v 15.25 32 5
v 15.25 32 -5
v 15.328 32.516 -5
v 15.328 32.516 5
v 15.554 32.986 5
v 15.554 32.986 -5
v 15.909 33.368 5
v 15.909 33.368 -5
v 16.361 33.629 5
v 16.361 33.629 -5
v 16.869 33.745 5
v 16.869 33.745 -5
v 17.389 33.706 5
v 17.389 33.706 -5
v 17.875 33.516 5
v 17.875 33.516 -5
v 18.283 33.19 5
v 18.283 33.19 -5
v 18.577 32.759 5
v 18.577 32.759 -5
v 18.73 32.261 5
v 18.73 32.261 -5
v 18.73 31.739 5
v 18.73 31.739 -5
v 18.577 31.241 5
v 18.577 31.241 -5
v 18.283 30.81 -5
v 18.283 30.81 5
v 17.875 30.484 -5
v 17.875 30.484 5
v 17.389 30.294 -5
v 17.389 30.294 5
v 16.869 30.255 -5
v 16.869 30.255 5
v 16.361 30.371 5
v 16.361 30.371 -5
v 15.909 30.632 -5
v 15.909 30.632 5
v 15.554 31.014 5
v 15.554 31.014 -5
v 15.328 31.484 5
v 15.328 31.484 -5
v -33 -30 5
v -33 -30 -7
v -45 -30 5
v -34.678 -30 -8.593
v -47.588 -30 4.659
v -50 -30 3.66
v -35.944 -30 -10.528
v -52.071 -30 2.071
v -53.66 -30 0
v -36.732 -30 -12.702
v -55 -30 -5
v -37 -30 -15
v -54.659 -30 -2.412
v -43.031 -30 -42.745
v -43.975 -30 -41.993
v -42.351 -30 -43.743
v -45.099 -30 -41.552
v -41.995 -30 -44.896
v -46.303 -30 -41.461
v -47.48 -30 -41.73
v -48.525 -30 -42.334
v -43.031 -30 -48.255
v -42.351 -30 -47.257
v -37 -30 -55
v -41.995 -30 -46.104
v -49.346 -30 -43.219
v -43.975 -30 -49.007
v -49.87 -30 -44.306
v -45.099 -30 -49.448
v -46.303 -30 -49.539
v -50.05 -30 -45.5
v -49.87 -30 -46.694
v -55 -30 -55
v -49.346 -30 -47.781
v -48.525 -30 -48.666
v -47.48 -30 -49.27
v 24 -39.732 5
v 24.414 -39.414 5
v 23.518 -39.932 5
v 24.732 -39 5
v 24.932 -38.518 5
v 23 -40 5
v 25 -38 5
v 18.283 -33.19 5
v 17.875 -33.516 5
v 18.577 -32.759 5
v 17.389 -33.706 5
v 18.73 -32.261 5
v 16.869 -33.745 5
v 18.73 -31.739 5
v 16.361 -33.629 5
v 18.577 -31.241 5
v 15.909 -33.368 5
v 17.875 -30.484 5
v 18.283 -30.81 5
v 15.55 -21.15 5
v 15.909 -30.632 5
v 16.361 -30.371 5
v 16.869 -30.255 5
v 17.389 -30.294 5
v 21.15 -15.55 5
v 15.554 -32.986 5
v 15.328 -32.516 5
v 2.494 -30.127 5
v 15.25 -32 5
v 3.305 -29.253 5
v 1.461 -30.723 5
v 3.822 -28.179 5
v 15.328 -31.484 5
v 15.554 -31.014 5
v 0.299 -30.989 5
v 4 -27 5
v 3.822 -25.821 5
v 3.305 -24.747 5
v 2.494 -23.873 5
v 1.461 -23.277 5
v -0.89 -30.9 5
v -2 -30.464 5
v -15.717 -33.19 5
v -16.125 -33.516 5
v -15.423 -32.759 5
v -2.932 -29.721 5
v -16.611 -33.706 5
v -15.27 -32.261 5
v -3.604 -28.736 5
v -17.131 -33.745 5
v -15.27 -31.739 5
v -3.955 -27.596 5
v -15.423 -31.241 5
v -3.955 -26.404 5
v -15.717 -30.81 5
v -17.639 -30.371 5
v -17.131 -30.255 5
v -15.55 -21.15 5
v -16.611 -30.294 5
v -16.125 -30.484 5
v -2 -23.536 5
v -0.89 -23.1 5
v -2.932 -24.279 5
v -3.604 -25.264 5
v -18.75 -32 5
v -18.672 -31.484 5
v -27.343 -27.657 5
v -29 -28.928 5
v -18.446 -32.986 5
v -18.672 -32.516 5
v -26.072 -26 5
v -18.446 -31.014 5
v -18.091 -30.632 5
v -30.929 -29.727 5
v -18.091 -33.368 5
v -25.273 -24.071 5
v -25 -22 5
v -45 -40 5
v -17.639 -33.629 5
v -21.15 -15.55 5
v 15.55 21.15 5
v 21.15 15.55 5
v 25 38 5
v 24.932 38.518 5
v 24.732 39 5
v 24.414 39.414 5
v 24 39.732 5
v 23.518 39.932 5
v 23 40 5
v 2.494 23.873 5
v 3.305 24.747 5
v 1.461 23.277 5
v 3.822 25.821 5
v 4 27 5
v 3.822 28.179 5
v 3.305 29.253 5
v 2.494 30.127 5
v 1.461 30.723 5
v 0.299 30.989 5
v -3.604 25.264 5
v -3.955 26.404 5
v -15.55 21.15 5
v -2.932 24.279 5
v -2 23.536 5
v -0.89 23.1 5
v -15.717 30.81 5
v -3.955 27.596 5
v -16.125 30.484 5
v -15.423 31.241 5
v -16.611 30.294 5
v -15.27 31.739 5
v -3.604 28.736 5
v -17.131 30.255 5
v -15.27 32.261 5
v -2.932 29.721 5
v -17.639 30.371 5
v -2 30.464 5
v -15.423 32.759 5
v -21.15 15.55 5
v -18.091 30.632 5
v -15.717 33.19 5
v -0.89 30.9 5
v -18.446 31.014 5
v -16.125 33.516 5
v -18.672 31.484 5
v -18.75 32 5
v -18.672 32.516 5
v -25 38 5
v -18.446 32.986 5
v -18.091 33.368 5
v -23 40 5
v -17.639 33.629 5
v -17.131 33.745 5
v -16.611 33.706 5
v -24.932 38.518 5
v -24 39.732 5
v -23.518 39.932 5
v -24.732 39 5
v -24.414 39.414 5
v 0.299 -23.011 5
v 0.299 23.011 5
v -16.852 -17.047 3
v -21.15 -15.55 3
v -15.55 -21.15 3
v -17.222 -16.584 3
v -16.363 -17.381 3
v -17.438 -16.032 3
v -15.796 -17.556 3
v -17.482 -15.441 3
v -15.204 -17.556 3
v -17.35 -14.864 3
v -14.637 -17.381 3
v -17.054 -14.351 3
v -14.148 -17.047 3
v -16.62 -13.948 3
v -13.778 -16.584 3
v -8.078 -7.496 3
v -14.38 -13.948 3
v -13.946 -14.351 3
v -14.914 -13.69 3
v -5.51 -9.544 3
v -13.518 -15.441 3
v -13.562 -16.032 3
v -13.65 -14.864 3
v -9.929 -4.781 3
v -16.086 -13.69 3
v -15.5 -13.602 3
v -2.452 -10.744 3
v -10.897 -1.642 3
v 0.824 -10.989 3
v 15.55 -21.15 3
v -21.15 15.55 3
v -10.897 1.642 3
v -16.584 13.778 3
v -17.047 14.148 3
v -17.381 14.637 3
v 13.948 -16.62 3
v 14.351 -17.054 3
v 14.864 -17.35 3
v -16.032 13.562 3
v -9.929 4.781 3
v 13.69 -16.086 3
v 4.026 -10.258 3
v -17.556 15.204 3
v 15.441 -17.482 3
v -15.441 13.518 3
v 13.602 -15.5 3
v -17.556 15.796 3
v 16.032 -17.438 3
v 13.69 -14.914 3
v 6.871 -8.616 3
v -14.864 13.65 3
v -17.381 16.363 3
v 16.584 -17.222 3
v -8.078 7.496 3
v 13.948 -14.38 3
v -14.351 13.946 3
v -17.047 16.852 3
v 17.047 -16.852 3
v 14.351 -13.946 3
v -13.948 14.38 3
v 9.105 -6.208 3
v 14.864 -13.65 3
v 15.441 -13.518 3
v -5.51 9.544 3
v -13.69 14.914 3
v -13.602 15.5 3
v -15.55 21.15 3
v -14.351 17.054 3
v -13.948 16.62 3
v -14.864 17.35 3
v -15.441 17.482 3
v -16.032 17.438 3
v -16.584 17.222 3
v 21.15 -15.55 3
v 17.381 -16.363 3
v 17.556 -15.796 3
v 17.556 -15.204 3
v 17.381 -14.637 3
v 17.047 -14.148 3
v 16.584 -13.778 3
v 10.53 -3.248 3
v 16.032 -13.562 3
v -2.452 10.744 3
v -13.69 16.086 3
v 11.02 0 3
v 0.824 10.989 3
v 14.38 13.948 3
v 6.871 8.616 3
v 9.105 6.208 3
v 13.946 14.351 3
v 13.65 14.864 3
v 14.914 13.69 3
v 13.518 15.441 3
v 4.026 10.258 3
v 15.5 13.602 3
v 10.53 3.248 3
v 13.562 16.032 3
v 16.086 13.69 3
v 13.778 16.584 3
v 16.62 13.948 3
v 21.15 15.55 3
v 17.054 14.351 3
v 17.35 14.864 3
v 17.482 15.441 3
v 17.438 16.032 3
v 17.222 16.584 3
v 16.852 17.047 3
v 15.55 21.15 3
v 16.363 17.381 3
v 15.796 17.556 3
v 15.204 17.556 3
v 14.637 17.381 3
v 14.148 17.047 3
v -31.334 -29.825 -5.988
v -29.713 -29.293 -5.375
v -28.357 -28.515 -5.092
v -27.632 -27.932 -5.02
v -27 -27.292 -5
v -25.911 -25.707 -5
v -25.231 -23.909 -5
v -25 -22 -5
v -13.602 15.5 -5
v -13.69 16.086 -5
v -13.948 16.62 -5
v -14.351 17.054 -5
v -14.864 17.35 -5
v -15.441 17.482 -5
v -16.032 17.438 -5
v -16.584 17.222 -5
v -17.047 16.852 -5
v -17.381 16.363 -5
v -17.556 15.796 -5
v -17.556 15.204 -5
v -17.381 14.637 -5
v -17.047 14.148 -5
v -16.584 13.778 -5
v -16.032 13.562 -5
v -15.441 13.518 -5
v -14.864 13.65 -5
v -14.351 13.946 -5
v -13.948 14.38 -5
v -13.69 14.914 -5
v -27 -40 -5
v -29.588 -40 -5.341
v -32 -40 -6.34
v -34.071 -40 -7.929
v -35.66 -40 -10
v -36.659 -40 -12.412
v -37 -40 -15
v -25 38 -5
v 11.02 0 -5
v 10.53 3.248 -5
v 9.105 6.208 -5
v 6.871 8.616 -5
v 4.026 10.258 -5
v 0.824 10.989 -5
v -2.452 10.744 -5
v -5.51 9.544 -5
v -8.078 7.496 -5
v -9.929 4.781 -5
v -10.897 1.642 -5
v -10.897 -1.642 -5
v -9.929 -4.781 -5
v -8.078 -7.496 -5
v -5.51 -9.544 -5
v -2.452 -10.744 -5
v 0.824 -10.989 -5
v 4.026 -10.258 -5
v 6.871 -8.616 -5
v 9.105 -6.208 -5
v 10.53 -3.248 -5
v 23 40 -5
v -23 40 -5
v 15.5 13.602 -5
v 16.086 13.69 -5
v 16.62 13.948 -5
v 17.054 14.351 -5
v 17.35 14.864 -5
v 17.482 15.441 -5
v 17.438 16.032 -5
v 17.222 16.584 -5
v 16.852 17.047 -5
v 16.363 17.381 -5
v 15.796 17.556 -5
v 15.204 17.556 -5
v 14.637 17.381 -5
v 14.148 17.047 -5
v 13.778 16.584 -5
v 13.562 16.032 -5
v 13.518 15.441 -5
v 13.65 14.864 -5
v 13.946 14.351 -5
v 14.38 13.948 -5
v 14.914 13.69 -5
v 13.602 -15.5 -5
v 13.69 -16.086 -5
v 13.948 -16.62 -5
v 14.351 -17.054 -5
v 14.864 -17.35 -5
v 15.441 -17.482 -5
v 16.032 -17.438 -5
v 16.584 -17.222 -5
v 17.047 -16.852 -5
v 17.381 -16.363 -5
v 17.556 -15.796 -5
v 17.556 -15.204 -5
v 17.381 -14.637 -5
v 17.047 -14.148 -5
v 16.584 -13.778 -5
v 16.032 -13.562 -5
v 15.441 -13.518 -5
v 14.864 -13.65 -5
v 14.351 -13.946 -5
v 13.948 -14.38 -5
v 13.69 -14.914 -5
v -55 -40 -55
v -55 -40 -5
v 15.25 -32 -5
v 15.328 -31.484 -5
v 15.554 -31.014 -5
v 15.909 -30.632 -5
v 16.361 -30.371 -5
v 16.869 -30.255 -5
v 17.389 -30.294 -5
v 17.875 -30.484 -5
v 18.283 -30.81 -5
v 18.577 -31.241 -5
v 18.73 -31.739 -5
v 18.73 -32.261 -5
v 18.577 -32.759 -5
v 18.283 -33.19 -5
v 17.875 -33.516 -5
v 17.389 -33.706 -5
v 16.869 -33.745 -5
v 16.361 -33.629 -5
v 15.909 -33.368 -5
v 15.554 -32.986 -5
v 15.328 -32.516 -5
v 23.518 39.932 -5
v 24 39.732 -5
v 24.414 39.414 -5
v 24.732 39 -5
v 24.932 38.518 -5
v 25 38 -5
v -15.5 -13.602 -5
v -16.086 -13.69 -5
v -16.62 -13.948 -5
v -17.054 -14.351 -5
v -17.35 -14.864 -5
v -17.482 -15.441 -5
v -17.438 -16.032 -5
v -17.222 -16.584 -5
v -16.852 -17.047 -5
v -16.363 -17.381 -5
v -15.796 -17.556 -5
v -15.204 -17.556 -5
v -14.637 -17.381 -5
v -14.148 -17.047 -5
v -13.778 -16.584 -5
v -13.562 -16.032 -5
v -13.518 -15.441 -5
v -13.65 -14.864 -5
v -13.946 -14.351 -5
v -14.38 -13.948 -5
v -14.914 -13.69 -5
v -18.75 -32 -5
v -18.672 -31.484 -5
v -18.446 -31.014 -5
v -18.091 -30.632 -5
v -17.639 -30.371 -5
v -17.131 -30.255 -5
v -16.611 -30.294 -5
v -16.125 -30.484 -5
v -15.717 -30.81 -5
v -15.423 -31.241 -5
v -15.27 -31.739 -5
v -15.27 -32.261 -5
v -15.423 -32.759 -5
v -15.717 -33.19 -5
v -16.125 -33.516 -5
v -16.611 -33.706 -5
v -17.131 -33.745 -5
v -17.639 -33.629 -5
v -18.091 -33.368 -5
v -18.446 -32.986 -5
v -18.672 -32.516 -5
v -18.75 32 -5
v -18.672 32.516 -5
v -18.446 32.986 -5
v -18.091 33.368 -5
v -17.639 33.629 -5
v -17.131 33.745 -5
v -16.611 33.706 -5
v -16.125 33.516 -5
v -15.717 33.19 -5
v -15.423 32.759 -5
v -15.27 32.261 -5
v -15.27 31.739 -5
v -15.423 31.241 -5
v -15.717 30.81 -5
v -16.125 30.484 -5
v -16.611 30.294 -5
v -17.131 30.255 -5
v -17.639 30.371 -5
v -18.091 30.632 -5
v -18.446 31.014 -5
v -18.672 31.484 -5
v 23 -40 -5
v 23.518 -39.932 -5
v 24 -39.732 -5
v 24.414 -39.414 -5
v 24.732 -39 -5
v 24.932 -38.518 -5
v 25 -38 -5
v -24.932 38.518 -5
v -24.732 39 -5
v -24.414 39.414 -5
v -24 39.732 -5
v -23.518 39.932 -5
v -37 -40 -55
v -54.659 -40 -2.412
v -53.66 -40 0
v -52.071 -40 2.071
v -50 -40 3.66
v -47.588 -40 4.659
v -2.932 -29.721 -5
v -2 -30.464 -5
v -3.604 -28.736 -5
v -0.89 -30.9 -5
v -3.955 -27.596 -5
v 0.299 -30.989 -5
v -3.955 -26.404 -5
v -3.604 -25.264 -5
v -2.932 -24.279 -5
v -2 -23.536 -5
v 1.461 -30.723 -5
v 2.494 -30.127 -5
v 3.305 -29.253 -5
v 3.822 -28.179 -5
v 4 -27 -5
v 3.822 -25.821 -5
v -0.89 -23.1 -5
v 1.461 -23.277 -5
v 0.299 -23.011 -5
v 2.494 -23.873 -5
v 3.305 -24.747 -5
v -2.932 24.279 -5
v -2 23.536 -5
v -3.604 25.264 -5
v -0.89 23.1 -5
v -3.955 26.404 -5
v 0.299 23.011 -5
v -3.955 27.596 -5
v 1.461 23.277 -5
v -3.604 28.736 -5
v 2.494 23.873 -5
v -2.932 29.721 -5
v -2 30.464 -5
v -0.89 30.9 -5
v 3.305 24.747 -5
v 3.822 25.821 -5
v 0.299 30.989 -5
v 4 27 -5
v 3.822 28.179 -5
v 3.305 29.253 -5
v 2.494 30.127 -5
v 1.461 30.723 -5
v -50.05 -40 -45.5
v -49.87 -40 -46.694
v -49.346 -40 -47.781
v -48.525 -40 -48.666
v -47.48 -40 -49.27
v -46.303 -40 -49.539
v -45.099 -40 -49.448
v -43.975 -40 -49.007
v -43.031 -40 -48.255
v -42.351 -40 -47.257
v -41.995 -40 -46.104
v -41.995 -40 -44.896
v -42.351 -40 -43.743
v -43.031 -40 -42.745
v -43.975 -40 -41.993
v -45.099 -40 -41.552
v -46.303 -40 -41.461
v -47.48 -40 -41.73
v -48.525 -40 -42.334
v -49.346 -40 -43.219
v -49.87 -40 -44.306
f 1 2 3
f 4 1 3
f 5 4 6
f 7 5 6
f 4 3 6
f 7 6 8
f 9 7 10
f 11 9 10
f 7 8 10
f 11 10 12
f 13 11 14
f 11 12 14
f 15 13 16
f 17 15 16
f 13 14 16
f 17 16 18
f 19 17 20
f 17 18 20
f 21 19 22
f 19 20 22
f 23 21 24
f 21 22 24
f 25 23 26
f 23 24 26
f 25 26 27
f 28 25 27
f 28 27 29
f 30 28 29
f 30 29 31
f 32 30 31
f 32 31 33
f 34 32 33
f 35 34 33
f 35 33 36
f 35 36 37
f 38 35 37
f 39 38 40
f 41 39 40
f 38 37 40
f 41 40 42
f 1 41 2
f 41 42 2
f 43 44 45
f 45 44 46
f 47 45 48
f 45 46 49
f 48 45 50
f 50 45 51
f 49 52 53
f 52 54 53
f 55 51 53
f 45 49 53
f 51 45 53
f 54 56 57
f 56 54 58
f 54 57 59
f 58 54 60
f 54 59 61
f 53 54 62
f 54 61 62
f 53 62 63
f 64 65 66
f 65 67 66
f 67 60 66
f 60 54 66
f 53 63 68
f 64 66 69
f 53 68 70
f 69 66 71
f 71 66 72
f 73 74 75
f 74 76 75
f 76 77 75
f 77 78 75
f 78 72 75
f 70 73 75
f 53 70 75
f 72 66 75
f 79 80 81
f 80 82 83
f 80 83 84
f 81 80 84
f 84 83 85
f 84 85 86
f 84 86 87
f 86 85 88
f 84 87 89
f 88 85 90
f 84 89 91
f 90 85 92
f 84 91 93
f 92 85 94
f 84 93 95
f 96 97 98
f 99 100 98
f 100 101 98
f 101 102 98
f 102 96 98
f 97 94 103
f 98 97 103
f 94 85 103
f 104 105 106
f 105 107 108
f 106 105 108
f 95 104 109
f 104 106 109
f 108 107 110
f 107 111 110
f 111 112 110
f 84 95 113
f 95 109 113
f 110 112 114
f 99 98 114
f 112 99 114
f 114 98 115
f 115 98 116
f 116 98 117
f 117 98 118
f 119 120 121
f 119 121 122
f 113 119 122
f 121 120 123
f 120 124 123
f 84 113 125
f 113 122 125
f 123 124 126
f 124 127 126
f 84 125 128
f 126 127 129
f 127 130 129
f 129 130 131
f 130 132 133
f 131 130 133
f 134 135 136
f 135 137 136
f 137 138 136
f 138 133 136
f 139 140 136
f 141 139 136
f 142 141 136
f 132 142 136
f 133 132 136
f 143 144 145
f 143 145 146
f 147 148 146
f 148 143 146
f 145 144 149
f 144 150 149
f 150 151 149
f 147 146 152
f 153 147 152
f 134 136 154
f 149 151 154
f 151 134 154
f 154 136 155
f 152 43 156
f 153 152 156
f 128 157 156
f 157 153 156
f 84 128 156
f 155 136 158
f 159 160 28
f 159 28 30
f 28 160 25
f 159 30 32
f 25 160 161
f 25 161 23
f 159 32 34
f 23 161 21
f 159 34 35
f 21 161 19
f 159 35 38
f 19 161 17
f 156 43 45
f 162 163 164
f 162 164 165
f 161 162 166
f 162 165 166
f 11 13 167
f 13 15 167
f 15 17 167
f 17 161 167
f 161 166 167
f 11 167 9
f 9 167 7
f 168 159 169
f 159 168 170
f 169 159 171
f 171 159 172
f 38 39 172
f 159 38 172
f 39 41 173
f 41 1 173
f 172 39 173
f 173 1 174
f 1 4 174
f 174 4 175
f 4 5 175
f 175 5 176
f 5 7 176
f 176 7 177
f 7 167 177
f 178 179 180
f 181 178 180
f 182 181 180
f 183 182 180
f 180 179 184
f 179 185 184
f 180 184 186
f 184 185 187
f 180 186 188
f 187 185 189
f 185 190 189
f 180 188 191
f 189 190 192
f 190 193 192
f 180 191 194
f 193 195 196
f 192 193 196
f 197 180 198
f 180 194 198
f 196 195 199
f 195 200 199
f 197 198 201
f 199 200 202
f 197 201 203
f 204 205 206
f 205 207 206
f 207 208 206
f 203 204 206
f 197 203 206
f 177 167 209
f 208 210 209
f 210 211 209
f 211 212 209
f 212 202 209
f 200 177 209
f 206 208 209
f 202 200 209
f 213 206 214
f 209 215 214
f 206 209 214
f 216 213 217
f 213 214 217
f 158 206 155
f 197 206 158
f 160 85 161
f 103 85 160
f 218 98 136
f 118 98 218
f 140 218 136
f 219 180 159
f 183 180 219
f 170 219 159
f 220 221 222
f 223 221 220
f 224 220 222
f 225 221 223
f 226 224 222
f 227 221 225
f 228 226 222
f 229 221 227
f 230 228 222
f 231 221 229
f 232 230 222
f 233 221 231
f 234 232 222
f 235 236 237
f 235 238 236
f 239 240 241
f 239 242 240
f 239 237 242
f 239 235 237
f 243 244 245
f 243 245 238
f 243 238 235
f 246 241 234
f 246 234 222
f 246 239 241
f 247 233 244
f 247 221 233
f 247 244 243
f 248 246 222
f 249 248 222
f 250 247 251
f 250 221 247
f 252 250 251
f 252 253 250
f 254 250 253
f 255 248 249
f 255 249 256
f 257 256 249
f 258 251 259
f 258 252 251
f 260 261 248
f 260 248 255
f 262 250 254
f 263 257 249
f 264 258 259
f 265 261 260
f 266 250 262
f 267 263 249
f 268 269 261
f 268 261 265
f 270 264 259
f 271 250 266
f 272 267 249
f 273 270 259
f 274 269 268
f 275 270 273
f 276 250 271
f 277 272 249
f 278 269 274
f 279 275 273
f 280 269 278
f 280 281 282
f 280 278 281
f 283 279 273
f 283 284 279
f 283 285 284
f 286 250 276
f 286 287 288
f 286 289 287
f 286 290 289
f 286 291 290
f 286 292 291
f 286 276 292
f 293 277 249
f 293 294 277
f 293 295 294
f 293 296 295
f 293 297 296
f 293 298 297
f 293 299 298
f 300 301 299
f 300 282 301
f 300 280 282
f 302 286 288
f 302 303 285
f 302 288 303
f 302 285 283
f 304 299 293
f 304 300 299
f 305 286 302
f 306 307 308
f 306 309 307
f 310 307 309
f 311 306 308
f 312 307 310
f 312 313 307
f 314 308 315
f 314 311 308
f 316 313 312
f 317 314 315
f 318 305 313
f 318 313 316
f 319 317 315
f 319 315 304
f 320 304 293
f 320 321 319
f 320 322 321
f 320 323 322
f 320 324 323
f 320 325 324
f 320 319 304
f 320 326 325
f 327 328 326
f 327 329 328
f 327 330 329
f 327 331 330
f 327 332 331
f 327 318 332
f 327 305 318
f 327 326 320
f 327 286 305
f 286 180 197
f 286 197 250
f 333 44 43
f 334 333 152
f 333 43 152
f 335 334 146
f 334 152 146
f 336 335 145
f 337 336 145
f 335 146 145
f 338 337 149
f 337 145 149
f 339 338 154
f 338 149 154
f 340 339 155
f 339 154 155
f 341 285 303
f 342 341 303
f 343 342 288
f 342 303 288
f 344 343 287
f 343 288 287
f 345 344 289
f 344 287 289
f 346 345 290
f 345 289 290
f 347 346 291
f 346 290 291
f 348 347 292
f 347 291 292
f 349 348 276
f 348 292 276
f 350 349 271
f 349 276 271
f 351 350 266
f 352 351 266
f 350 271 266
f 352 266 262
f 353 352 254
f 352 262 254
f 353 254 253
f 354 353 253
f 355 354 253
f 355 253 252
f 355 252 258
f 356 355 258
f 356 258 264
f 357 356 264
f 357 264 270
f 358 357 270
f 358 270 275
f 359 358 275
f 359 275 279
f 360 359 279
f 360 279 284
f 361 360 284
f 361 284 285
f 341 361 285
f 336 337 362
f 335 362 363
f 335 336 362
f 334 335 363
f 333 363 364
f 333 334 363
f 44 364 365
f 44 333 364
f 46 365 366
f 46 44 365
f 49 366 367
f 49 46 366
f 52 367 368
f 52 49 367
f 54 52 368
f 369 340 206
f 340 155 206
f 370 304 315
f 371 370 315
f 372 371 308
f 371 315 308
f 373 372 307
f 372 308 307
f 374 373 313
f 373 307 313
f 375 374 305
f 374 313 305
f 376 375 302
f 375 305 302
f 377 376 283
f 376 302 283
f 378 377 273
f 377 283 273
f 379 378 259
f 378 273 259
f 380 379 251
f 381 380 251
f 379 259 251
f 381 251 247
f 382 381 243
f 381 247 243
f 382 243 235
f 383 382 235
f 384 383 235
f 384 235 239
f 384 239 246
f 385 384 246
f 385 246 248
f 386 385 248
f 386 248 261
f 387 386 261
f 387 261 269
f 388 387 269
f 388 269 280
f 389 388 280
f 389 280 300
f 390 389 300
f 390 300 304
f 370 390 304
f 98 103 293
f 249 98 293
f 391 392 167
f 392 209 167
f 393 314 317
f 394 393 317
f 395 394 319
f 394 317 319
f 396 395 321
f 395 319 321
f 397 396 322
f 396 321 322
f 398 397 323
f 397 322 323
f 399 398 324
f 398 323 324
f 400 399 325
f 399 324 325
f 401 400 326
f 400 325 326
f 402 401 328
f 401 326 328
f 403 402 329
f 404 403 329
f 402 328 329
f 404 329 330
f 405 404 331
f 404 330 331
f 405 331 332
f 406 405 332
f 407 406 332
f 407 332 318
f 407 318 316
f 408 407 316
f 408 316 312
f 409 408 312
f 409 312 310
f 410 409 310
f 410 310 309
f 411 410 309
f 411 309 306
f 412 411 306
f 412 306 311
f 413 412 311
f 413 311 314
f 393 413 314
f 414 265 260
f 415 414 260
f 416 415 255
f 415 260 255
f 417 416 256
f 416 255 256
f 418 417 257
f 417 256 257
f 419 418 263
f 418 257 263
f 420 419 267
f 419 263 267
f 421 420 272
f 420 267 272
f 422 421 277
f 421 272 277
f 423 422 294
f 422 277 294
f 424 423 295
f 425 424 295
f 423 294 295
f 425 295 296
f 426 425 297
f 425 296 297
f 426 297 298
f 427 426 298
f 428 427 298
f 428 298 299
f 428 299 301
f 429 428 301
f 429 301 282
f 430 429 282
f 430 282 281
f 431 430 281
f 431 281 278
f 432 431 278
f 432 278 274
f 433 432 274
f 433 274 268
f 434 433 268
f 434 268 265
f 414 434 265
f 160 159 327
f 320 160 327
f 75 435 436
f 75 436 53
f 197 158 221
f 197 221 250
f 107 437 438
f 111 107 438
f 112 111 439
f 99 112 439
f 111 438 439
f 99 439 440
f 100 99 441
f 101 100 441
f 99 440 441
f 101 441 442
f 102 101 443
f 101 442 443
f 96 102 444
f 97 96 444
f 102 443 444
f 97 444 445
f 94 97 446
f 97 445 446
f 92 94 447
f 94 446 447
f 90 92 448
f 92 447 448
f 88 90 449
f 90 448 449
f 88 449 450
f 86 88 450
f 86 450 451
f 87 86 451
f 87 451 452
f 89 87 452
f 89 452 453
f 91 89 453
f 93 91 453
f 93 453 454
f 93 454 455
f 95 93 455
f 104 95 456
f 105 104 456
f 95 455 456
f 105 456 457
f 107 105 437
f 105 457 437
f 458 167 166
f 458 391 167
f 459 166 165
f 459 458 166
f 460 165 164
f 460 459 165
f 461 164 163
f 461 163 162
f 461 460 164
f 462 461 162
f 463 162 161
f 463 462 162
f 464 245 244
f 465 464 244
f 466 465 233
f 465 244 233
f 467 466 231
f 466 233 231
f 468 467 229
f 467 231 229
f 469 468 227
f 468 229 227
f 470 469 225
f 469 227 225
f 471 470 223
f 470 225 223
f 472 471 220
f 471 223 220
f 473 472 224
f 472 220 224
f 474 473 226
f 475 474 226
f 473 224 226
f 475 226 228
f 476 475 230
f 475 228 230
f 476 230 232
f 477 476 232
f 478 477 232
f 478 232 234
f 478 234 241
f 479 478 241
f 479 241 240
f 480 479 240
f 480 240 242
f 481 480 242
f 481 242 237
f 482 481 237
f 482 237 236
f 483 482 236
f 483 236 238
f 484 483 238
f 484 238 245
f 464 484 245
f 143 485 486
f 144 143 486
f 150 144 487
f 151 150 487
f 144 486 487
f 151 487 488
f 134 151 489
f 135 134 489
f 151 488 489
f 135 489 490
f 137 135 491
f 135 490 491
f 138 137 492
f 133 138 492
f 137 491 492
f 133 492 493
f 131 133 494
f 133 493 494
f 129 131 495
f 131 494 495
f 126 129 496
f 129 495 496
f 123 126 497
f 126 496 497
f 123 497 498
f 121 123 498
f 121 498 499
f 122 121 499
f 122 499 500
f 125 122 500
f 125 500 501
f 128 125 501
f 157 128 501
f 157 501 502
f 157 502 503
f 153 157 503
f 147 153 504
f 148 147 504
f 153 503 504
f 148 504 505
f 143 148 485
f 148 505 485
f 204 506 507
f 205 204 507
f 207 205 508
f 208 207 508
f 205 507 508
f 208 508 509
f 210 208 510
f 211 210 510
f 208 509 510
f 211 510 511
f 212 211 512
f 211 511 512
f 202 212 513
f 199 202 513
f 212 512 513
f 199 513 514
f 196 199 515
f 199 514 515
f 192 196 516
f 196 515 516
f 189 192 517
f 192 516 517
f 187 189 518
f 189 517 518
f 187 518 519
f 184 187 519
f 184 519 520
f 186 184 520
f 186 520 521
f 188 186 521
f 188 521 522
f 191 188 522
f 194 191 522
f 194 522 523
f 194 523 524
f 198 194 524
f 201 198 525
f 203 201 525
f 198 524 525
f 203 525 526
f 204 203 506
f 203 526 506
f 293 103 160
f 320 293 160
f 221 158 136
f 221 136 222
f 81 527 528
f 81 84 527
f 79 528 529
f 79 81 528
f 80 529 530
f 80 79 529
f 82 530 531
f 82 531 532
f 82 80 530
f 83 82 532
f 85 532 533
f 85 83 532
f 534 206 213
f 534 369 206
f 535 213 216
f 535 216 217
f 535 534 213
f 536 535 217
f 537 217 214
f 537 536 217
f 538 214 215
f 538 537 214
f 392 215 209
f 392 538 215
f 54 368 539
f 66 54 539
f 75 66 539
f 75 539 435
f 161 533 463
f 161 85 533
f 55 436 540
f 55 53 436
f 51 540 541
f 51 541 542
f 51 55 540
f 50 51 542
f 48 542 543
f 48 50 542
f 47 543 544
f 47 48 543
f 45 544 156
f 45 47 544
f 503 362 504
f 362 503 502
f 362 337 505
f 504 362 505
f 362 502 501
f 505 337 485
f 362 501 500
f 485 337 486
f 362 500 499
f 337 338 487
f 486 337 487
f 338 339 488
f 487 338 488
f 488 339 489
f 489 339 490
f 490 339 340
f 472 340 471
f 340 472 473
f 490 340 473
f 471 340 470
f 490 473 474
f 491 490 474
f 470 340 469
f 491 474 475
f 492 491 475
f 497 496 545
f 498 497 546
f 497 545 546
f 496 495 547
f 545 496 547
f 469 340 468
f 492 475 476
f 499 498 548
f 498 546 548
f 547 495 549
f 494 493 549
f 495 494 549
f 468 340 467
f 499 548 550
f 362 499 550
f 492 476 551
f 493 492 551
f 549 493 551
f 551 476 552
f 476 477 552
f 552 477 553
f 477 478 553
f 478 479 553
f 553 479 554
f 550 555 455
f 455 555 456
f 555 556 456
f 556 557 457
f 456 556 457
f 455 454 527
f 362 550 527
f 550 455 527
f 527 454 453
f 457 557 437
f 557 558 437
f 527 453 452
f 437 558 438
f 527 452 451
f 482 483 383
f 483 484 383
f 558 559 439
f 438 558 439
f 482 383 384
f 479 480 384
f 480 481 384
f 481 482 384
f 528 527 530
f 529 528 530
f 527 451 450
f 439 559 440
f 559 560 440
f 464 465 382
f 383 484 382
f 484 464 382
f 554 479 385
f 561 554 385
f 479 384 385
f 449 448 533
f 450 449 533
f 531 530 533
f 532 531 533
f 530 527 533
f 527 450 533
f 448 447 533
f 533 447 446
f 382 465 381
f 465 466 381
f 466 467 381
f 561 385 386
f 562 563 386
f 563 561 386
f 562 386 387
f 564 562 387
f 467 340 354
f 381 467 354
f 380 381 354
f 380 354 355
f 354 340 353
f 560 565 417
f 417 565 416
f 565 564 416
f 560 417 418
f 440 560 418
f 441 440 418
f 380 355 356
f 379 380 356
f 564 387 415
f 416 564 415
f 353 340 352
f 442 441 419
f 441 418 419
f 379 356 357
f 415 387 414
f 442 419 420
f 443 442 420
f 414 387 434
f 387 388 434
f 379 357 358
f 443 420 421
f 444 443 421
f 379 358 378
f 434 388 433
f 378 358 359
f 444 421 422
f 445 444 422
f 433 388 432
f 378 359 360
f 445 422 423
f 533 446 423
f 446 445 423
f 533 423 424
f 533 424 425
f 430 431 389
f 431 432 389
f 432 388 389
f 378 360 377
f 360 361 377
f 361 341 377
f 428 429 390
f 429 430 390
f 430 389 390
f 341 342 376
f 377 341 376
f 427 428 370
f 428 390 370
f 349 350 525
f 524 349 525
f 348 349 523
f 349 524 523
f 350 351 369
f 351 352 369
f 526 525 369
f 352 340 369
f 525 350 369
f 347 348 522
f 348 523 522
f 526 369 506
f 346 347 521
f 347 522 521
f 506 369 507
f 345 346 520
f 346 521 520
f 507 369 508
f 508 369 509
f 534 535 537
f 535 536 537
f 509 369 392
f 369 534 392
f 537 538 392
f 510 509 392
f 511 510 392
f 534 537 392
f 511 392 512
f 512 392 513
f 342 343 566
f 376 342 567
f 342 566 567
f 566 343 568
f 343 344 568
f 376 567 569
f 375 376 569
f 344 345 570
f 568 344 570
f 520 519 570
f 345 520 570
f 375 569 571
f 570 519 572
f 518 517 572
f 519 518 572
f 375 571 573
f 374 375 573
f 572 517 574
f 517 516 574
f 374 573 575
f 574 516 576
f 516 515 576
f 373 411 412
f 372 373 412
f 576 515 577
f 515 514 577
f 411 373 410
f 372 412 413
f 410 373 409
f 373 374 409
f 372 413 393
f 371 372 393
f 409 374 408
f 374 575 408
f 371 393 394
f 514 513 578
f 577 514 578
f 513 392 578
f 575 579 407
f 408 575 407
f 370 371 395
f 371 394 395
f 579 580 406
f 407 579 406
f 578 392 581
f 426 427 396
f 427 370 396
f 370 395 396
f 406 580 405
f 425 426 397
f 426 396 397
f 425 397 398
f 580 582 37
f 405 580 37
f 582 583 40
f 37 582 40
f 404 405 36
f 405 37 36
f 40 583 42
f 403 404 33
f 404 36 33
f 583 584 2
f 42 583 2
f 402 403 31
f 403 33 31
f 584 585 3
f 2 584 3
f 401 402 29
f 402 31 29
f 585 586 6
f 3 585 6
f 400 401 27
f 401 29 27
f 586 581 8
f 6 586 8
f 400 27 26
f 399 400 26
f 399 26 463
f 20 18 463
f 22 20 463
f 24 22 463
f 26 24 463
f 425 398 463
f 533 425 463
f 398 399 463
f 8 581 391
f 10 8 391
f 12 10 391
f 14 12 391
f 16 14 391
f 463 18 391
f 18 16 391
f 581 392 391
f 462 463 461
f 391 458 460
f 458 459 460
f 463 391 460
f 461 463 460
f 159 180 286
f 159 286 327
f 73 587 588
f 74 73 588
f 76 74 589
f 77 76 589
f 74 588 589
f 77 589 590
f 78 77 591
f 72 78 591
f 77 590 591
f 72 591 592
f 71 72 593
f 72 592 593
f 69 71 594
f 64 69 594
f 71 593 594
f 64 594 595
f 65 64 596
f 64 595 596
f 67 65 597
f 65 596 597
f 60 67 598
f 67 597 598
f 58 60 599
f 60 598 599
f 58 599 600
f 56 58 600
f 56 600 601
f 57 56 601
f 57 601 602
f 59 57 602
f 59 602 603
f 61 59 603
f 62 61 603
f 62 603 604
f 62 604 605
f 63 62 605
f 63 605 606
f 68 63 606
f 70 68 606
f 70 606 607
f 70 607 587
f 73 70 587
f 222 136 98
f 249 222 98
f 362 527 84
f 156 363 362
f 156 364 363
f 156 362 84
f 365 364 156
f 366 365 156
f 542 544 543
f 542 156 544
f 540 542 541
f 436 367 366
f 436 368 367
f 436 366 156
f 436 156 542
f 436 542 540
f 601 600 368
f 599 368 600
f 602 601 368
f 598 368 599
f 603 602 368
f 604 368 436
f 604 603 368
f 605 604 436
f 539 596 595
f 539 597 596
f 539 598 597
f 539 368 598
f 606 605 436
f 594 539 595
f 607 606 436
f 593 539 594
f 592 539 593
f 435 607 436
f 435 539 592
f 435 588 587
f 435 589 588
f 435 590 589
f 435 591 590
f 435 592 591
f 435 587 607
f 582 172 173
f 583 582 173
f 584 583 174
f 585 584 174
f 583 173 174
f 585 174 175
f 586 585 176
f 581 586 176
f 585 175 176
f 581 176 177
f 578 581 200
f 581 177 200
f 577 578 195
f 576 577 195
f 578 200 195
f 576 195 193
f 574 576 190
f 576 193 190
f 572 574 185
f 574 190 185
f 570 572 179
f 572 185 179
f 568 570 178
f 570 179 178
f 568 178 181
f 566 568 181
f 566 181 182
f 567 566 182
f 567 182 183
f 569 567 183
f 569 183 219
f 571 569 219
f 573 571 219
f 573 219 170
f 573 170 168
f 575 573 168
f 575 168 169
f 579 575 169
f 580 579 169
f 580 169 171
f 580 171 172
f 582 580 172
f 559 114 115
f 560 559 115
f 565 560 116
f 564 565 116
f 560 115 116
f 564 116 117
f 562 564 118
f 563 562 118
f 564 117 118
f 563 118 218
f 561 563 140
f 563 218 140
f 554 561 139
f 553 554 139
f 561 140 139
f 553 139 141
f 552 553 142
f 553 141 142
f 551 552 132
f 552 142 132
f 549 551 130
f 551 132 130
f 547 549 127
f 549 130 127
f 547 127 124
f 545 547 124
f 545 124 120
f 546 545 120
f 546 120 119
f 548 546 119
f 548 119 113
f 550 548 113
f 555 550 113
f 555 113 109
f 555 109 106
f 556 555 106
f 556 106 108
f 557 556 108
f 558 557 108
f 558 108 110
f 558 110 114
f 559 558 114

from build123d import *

# Parameters (mm, degrees)
ESBO_O1_W                     = 50
ESBO_O1_H                     = 80
RESSALTO_EXTRUS_O1_DEPTH      = 5
ESBO_O2_W                     = 42.3
ESBO_O2_H                     = 42.3
CORTE_EXTRUS_O1_DEPTH         = 2
ESBO_O3_R                     = 11.02
CORTE_EXTRUS_O2_DEPTH         = 24
ESBO_O4_R                     = 1.987893006
CORTE_EXTRUS_O3_DEPTH         = 24
PADR_OCIRCULAR1_COUNT         = 4
ESBO_O5_R                     = 4
CORTE_EXTRUS_O4_DEPTH         = 24
CHANFRO1_SIZE                 = 5.6
ESBO_O6_R                     = 1.75
CORTE_EXTRUS_O5_DEPTH         = 10
FILETE1_R                     = 2
ESBO_O7_W                     = 30
ESBO_O7_H                     = 10
RESSALTO_EXTRUS_O2_DEPTH      = 50
RESSALTO_EXTRUS_O2_DEPTH_BACK = 10
ESBO_O8_R                     = 4.05
CORTE_EXTRUS_O6_DEPTH         = 45
ESBO_O9_W                     = 12
ESBO_O9_H                     = 50
CORTE_EXTRUS_O7_DEPTH         = 45
FILETE2_R                     = 10
FILETE3_R                     = 8


with BuildPart() as part:
    # Esboço1 → Ressalto-extrusão1 (new body, symmetric)
    with BuildSketch(Plane.XY):
        Rectangle(ESBO_O1_W, ESBO_O1_H)
    extrude(amount=RESSALTO_EXTRUS_O1_DEPTH, both=True)

    # Esboço2 → Corte-extrusão1 (cut)
    with BuildSketch(Plane.XY.offset(5)):
        Rectangle(ESBO_O2_W, ESBO_O2_H)
    extrude(amount=-CORTE_EXTRUS_O1_DEPTH, mode=Mode.SUBTRACT)

    # Esboço3 → Corte-extrusão2 (cut)
    with BuildSketch(Plane.XY.offset(3)):
        Circle(ESBO_O3_R)
    extrude(amount=-CORTE_EXTRUS_O2_DEPTH, mode=Mode.SUBTRACT)

    # Esboço4 → Corte-extrusão3 (cut)
    with BuildSketch(Plane.XY.offset(3)):
        with Locations((-15.59, 15.5)):
            Circle(ESBO_O4_R)
    corte_extrus_o3 = extrude(amount=-CORTE_EXTRUS_O3_DEPTH, mode=Mode.SUBTRACT)

    # PadrãoCircular1: Corte-extrusão3 ×4 about axis
    padr_ocircular1_axis = Axis((0, 0, 0), (0, 0, 1))
    for i in range(1, PADR_OCIRCULAR1_COUNT):
        add(corte_extrus_o3.rotate(padr_ocircular1_axis, i * 360 / PADR_OCIRCULAR1_COUNT), mode=Mode.SUBTRACT)

    # Esboço5 → Corte-extrusão4 (cut)
    with BuildSketch(Plane.XY.offset(5)):
        with Locations((0, 27)):
            Circle(ESBO_O5_R)
        with Locations((0, -27)):
            Circle(ESBO_O5_R)
    extrude(amount=-CORTE_EXTRUS_O4_DEPTH, mode=Mode.SUBTRACT)

    # Chanfro1
    chanfro1_edges = [part.edges().sort_by_distance(p)[0] for p in [
        (21.15, 21.15, 4),
        (21.15, -21.15, 4),
        (-21.15, -21.15, 4),
        (-21.15, 21.15, 4),
    ]]
    chamfer(chanfro1_edges, length=CHANFRO1_SIZE)

    # Esboço6 → Corte-extrusão5 (cut)
    with BuildSketch(Plane(origin=(0, 0, -5), x_dir=(-1, 0, 0), z_dir=(0, 0, -1))):
        with Locations((-17, 32)):
            Circle(ESBO_O6_R)
        with Locations((17, 32)):
            Circle(ESBO_O6_R)
        with Locations((-17, -32)):
            Circle(ESBO_O6_R)
        with Locations((17, -32)):
            Circle(ESBO_O6_R)
    extrude(amount=-CORTE_EXTRUS_O5_DEPTH, mode=Mode.SUBTRACT)

    # Filete1
    filete1_edges = [part.edges().sort_by_distance(p)[0] for p in [
        (25, -40, 0),
        (-25, 40, 0),
        (25, 40, 0),
    ]]
    fillet(filete1_edges, radius=FILETE1_R)

    # Esboço7 → Ressalto-extrusão2 (add, two sides)
    with BuildSketch(Plane(origin=(0, 0, -5), x_dir=(-1, 0, 0), z_dir=(0, 0, -1))) as ressalto_extrus_o2_sk:
        with Locations((40, -35)):
            Rectangle(ESBO_O7_W, ESBO_O7_H)
    extrude(amount=RESSALTO_EXTRUS_O2_DEPTH)
    extrude(ressalto_extrus_o2_sk.sketch, amount=-RESSALTO_EXTRUS_O2_DEPTH_BACK)

    # Esboço8 → Corte-extrusão6 (cut)
    with BuildSketch(Plane(origin=(0, -40, 0), x_dir=(-1, 0, 0), z_dir=(0, -1, 0))):
        with Locations((46, 45.5)):
            Circle(ESBO_O8_R)
    extrude(amount=-CORTE_EXTRUS_O6_DEPTH, mode=Mode.SUBTRACT)

    # Esboço9 → Corte-extrusão7 (cut)
    with BuildSketch(Plane(origin=(0, -40, 0), x_dir=(-1, 0, 0), z_dir=(0, -1, 0))):
        with Locations((31, 30)):
            Rectangle(ESBO_O9_W, ESBO_O9_H)
    extrude(amount=-CORTE_EXTRUS_O7_DEPTH, mode=Mode.SUBTRACT)

    # Filete2
    filete2_edges = [part.edges().sort_by_distance(p)[0] for p in [
        (-55, -35, 5),
        (-37, -35, -5),
    ]]
    fillet(filete2_edges, radius=FILETE2_R)

    # Filete3
    filete3_edges = [part.edges().sort_by_distance(p)[0] for p in [
        (-25, -30, 0),
    ]]
    fillet(filete3_edges, radius=FILETE3_R)


solid = part.part
